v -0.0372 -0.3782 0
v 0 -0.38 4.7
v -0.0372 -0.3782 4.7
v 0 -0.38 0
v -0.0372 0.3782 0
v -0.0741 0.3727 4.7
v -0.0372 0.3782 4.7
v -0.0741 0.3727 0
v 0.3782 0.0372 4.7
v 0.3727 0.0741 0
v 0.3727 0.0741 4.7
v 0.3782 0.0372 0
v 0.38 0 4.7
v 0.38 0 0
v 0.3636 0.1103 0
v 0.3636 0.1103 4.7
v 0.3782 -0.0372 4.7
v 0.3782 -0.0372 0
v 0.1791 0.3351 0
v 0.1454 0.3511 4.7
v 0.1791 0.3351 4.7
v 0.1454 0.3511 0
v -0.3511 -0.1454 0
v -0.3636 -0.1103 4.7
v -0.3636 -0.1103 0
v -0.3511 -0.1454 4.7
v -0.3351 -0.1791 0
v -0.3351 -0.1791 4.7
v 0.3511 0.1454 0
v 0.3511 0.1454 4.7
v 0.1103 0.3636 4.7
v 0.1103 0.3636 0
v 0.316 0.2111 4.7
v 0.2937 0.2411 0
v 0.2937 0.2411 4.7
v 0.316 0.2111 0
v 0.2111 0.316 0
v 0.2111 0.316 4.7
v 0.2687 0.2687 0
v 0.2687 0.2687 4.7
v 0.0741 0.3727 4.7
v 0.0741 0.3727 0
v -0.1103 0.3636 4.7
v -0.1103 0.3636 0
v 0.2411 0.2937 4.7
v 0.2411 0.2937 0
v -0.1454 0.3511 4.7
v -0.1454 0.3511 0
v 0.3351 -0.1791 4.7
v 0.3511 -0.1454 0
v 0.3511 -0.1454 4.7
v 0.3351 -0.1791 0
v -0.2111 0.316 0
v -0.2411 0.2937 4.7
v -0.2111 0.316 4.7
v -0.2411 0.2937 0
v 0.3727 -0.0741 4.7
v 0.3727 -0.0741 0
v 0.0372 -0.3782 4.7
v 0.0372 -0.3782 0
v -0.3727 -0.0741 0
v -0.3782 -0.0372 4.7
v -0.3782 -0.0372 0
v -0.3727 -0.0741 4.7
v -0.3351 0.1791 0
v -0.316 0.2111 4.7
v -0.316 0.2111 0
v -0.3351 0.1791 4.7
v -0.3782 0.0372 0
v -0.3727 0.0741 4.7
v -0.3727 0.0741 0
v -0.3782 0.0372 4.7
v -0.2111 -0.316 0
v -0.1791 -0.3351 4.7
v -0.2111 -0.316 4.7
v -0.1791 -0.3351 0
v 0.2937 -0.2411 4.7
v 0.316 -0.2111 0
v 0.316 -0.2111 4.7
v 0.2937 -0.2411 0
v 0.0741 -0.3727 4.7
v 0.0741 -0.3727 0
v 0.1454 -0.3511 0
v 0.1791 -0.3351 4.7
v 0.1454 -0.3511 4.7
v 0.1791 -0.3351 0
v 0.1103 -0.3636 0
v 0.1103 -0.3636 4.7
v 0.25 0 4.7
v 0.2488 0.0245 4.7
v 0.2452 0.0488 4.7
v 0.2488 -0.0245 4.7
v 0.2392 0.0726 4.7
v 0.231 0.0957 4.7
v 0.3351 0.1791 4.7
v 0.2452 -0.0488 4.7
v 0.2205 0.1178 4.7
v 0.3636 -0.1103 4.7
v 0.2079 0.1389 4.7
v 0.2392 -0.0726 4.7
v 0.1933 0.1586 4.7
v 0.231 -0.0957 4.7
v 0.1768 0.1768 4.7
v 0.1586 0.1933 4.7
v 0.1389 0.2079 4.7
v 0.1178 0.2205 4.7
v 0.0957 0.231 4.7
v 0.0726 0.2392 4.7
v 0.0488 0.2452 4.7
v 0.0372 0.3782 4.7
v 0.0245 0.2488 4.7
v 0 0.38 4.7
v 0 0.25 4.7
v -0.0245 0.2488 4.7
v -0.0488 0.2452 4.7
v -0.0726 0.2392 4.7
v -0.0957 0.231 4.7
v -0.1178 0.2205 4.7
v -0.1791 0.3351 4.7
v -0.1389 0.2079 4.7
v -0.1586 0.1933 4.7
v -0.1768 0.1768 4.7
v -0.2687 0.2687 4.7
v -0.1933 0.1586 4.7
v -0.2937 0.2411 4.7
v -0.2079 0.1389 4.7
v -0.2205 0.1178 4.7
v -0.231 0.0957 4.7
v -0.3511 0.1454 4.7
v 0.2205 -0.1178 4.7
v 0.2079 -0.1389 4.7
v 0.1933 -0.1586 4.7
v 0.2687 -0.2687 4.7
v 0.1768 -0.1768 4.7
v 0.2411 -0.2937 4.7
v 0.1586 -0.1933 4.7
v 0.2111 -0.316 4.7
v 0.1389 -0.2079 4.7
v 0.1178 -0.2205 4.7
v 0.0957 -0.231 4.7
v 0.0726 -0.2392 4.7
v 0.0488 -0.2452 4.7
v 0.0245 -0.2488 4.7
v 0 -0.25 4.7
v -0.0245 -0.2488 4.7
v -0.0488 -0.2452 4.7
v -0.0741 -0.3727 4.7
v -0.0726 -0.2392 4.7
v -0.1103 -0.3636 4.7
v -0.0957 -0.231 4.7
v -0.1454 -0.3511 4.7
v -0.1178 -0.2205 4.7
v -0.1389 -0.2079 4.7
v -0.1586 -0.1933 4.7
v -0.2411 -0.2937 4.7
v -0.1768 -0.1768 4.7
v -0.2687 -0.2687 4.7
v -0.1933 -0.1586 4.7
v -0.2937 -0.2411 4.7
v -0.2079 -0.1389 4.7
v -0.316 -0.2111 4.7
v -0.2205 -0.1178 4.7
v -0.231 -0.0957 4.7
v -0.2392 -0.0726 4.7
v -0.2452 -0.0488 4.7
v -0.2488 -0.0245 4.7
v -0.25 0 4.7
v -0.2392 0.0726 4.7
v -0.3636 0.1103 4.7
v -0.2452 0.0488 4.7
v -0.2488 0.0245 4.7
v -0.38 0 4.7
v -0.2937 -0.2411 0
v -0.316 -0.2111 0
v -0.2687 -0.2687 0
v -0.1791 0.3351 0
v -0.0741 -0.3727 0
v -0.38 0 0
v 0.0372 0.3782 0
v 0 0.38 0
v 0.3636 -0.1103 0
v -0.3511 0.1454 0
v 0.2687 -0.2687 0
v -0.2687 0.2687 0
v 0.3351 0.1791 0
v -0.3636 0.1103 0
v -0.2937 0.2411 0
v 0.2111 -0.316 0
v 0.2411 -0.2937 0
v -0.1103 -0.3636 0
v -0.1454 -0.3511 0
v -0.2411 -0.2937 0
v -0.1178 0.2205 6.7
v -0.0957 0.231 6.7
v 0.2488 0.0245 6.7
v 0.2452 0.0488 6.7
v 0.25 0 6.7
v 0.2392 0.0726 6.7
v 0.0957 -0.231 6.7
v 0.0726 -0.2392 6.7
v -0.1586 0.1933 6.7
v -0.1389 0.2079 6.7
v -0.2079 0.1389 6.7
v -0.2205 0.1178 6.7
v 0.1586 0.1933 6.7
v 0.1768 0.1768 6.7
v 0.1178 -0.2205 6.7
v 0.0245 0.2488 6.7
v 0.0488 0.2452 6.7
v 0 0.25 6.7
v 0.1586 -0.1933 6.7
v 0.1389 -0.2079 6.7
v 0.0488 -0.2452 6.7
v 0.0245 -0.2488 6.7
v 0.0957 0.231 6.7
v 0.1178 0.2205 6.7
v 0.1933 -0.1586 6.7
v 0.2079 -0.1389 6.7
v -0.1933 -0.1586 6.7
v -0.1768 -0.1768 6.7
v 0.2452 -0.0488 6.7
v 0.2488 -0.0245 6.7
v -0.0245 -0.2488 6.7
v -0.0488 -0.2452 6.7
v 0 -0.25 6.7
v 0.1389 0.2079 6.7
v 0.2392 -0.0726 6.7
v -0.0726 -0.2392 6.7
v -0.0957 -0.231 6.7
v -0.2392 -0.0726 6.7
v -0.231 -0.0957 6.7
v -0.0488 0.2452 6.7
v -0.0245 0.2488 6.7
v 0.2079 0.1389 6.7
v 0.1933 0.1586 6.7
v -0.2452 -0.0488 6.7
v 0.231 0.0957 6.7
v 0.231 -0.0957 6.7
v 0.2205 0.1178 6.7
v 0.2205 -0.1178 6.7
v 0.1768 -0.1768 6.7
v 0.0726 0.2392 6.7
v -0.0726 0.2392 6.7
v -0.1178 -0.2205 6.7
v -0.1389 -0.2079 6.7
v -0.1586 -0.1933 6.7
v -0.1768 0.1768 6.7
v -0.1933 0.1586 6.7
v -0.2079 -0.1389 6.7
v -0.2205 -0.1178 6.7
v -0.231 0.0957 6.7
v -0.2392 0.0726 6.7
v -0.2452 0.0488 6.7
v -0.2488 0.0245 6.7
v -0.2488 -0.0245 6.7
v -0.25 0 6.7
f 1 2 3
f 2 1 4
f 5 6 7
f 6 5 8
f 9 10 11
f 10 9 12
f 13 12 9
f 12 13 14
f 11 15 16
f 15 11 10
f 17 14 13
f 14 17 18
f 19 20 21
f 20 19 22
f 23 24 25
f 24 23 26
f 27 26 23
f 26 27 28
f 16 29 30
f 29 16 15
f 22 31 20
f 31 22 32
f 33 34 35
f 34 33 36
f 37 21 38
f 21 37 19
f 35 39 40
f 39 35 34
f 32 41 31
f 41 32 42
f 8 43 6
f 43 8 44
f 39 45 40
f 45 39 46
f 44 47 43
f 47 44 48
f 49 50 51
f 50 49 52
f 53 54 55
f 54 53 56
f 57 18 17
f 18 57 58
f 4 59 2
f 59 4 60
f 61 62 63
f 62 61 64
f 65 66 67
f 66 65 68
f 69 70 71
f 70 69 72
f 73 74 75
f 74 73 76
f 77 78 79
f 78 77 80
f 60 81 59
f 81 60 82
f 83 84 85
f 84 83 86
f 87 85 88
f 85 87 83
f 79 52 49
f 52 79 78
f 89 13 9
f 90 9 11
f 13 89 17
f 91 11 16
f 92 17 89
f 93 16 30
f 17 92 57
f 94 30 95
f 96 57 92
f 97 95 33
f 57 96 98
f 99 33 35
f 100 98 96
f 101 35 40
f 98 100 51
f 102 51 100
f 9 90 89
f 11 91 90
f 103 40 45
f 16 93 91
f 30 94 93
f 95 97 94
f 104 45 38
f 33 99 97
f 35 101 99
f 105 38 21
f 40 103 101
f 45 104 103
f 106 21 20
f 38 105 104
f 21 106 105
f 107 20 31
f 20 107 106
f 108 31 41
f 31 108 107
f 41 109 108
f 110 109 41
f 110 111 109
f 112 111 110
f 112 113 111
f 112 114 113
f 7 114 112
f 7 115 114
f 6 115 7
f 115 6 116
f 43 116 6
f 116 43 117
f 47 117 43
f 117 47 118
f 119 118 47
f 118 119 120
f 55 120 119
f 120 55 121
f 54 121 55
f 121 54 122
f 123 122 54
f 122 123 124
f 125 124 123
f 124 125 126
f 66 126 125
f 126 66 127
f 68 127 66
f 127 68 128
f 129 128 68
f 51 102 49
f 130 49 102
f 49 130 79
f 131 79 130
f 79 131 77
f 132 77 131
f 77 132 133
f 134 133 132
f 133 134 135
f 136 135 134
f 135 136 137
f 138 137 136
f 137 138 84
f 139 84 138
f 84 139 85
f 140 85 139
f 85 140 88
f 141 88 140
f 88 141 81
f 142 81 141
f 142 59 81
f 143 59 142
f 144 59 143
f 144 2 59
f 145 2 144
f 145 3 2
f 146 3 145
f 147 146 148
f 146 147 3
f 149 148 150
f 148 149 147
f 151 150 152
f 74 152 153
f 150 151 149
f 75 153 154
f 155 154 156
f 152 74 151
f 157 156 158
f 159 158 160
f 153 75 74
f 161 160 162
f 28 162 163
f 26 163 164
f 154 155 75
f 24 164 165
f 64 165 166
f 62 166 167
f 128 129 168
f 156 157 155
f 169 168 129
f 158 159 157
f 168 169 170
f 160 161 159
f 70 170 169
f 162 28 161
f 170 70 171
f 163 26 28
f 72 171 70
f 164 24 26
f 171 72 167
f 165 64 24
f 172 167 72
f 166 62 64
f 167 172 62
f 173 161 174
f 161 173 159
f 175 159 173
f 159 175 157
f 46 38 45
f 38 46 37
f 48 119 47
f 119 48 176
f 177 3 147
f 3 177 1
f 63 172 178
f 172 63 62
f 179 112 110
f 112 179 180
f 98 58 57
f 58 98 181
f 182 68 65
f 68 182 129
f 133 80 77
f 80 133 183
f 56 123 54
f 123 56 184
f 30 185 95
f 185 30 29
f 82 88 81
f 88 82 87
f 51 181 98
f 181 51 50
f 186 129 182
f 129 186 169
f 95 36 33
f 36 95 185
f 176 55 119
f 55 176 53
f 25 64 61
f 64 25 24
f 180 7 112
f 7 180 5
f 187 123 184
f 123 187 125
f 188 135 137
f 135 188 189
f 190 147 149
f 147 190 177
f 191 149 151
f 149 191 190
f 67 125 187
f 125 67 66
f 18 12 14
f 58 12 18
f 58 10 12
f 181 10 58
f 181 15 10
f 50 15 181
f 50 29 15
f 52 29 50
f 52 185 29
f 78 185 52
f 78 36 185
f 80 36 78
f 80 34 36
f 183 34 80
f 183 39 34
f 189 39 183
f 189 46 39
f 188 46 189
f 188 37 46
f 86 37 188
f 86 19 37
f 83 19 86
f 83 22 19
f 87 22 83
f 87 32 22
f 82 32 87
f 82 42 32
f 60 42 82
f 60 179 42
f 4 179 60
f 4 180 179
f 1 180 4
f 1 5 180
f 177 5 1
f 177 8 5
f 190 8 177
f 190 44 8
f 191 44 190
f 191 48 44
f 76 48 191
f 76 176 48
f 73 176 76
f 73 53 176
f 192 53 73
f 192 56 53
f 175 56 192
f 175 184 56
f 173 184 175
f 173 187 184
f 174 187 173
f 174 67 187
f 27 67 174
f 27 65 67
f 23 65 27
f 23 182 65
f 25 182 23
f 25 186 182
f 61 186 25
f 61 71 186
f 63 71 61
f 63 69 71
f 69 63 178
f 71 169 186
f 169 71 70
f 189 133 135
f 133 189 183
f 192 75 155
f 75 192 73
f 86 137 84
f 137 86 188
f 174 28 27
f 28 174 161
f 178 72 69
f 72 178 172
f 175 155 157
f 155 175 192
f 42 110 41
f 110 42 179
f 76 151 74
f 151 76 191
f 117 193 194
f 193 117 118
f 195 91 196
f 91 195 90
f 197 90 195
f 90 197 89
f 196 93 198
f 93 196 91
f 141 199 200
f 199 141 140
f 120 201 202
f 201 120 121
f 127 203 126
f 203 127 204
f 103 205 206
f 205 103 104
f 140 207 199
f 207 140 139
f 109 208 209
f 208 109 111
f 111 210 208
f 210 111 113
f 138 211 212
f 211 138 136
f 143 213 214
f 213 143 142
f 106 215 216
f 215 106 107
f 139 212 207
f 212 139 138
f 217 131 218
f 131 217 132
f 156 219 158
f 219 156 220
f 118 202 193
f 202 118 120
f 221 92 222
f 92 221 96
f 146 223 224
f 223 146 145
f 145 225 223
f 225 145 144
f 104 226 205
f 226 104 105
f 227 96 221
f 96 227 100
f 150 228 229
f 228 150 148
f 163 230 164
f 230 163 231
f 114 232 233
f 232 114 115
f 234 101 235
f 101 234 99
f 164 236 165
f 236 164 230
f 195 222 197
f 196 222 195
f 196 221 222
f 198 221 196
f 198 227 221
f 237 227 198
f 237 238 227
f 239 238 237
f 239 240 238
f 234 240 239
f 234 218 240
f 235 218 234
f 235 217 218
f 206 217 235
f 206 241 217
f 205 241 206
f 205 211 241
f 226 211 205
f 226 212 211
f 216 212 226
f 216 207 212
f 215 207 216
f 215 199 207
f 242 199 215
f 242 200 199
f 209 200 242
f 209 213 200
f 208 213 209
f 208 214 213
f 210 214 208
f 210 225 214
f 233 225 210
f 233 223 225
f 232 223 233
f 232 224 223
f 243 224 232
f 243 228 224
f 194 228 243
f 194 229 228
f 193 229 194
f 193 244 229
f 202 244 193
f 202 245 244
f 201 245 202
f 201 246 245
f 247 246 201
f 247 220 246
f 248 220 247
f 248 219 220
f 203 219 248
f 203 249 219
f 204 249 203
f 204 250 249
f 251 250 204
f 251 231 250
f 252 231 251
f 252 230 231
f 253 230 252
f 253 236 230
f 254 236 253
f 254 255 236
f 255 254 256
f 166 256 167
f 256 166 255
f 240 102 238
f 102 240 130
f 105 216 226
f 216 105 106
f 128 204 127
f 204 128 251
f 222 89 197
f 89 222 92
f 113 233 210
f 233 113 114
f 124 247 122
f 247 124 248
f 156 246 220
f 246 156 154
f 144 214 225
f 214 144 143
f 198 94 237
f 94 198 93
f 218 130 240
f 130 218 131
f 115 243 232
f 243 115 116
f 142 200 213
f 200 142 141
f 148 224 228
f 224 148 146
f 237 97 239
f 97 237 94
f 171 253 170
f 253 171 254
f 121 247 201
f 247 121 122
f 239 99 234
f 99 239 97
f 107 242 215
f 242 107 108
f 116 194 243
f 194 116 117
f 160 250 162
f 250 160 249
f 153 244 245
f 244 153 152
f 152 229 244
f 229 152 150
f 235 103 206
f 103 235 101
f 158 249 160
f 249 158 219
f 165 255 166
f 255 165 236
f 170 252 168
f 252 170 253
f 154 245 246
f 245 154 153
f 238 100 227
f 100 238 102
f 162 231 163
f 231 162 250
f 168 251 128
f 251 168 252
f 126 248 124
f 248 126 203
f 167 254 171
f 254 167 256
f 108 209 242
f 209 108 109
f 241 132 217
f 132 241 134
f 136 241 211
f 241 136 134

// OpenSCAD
module toggle_switch() {
    union() {
        // Main body of the toggle switch
        cylinder(h=4.7, d=0.76, $fn=64);
        
        // Toggle lever
        translate([0, 0, 4.7])
            cylinder(h=2, d=0.5, $fn=64);
    }
}

toggle_switch();
